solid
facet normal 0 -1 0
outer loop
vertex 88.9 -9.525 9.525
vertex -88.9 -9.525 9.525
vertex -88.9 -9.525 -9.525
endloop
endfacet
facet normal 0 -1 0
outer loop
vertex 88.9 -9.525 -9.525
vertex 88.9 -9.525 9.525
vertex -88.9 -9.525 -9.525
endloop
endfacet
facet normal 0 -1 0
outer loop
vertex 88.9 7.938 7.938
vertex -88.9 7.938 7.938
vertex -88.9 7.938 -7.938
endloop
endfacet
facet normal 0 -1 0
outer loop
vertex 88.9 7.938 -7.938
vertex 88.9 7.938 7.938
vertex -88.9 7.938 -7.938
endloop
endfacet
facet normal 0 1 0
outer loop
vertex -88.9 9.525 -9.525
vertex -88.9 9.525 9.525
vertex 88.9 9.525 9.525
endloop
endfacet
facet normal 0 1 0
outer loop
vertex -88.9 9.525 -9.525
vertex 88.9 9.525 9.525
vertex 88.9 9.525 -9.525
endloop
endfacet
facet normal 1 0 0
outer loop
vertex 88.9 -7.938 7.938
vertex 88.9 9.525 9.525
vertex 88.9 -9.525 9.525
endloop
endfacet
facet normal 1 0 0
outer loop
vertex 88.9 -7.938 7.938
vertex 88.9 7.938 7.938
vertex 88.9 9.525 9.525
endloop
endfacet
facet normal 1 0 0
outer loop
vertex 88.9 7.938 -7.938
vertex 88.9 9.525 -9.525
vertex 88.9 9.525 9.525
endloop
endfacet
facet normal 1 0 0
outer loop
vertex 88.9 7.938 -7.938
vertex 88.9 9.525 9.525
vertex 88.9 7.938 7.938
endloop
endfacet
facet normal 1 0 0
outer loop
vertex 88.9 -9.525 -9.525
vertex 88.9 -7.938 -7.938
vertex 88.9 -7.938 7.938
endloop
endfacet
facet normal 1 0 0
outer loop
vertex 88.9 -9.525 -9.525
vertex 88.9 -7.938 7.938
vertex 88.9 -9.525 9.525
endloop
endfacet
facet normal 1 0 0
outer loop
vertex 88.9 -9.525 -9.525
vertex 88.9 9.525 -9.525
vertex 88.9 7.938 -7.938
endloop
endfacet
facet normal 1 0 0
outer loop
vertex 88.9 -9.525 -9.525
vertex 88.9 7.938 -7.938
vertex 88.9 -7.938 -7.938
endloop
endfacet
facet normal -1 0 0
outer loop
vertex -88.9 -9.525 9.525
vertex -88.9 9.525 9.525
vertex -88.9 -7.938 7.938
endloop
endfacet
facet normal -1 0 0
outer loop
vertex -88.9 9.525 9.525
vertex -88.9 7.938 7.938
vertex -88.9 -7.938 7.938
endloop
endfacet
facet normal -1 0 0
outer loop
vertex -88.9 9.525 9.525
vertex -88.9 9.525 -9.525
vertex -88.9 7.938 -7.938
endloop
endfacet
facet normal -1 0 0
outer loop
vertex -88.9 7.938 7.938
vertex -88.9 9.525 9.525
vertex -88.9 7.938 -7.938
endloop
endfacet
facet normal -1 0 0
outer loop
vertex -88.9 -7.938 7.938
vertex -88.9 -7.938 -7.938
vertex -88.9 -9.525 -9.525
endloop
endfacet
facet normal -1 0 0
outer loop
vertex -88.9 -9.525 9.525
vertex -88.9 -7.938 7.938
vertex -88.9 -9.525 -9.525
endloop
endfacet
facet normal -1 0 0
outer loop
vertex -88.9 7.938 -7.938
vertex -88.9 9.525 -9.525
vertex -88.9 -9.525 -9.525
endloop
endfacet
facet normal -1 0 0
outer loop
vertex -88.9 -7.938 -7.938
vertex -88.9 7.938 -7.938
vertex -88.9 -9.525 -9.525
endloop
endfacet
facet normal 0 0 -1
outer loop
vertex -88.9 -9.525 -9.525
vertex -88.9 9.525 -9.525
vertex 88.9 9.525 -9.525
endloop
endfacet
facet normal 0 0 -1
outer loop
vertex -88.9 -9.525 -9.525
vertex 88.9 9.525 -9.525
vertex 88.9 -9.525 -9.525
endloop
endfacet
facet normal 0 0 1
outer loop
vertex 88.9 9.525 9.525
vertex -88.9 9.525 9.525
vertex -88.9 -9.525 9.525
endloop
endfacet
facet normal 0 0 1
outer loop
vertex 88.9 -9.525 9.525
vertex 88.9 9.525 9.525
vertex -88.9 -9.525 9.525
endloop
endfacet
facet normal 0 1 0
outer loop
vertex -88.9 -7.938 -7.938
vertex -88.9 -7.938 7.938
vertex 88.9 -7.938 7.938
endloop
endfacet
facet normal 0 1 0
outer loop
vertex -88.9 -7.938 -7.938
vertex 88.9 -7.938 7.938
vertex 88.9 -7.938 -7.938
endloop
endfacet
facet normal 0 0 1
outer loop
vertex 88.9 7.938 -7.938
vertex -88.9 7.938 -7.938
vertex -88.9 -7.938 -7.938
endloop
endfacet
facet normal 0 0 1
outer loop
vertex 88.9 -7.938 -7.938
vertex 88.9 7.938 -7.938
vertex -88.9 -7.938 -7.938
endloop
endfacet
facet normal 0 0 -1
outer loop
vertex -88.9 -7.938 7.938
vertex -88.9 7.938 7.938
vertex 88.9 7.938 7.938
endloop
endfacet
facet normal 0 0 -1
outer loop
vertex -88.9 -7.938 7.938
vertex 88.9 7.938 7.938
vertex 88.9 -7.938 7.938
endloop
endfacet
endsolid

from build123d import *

# Parameters (mm, degrees)
SKETCH1_W           = 19.05
SKETCH1_H           = 19.05
SKETCH1_W_2         = 15.875
SKETCH1_H_2         = 15.875
BOSS_EXTRUDE1_DEPTH = 88.9


with BuildPart() as part:
    # Sketch1 → Boss-Extrude1 (new body, symmetric)
    with BuildSketch(Plane(origin=(0, 0, 0), x_dir=(0, -1, 0), z_dir=(1, 0, 0))):
        Rectangle(SKETCH1_W, SKETCH1_H)
        Rectangle(SKETCH1_W_2, SKETCH1_H_2, mode=Mode.SUBTRACT)
    extrude(amount=BOSS_EXTRUDE1_DEPTH, both=True)


solid = part.part
